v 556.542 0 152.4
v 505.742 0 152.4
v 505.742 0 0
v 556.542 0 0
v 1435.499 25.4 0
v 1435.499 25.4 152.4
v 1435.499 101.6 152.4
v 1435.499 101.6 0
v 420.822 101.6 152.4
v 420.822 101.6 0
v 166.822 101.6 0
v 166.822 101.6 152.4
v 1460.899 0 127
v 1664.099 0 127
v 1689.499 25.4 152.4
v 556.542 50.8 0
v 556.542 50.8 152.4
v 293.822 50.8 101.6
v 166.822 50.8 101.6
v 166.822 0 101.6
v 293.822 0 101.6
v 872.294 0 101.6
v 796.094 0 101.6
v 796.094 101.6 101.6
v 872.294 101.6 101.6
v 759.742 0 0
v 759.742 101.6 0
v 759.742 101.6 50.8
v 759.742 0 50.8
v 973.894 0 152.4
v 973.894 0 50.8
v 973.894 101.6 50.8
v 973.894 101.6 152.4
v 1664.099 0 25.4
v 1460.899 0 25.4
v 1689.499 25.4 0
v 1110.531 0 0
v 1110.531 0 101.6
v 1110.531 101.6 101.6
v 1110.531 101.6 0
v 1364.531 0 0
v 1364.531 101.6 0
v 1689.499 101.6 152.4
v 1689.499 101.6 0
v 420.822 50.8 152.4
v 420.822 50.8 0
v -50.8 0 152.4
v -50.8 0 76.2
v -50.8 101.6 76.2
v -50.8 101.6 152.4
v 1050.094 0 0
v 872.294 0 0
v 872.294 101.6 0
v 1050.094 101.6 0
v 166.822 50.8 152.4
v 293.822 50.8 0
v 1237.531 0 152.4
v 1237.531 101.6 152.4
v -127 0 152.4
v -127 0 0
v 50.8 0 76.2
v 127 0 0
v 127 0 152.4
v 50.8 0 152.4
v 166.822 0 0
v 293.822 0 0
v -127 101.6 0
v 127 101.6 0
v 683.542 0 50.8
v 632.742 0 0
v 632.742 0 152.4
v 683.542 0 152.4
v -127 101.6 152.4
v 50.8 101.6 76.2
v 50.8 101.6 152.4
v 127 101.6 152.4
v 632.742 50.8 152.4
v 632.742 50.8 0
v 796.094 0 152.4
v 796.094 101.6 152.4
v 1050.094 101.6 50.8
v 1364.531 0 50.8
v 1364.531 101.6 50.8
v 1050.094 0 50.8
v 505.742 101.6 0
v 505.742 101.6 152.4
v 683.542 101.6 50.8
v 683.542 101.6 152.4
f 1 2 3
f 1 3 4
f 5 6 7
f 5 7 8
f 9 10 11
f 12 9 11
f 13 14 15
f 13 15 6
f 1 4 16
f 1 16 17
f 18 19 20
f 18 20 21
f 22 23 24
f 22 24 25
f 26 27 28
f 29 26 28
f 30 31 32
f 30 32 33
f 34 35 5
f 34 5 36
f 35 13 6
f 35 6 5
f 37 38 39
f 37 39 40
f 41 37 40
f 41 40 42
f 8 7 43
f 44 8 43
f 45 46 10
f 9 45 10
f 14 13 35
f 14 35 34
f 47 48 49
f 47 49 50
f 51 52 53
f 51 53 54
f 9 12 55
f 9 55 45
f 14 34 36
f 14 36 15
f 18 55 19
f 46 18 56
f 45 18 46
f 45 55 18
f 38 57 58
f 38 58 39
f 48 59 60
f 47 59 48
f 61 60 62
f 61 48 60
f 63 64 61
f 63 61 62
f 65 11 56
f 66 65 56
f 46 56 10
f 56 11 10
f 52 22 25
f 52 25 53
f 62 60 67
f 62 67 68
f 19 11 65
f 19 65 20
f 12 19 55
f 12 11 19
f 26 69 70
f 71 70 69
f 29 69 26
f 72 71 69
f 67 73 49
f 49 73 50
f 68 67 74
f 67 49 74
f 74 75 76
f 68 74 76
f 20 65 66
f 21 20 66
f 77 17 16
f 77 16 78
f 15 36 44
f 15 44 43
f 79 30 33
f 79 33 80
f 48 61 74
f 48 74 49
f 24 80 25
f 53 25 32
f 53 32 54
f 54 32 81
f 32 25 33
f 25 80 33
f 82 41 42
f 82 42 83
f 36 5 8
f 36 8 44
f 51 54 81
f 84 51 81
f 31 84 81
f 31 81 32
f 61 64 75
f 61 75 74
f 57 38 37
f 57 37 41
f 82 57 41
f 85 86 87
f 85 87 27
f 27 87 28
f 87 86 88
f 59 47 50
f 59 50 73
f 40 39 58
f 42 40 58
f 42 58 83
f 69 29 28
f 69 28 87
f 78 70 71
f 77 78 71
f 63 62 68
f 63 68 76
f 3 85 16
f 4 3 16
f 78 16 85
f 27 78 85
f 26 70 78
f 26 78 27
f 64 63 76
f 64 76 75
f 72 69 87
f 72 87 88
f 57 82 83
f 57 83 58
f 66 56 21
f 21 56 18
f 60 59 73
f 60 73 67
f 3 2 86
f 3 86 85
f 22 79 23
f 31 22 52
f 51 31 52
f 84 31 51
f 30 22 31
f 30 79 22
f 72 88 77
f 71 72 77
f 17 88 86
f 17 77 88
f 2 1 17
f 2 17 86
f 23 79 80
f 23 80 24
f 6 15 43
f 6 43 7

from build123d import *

# Parameters (mm, degrees)
F1_DEPTH  = 101.6
F3_DEPTH  = 152.4
F4_DEPTH  = 25.4
F5_W      = 127
F5_H      = 50.8
F6_DEPTH  = 25.4
F7_DEPTH  = 25.4
F9_DEPTH  = 101.6
F10_W     = 76.2
F10_H     = 152.4
F11_DEPTH = 50.8
F13_DEPTH = 101.6
F15_DEPTH = 101.6
F16_W     = 203.2
F16_H     = 101.6
F17_DEPTH = 101.6
F18_SIZE  = 25.4


with BuildPart() as f1:
    # F0 (on Front) → F1 (new body)
    with BuildSketch(Plane.XZ):
        Polygon((-127, 0), (0, 0), (127, 0), (127, 152.4), (50.8, 152.4), (50.8, 76.2), (-50.8, 76.2), (-50.8, 152.4), (-127, 152.4), align=None)
    extrude(amount=-F1_DEPTH)


with BuildPart() as f3:
    # F2 (on Top) → F3 (new body)
    with BuildSketch(Plane.XY):
        Polygon((166.8223488978, 101.6), (166.8223488978, 0), (293.8223488978, 0), (293.8223488978, 50.8), (420.8223488978, 50.8), (420.8223488978, 101.6), align=None)
    extrude(amount=F3_DEPTH)

    # F4 (cut): a face of the model
    f4_faces = [f3.faces().sort_by_distance(p)[0] for p in [
        (230.3223488978, 0, 76.2),
    ]]
    extrude(f4_faces, amount=-F4_DEPTH, mode=Mode.SUBTRACT)

    # F5 (on face) → F6 (cut)
    with BuildSketch(Plane.XZ.offset(-25.4)):
        with Locations((230.3223488978, 127)):
            Rectangle(F5_W, F5_H)
    extrude(amount=-F6_DEPTH, mode=Mode.SUBTRACT)

    # F7 (add): a face of the model
    f7_faces = [f3.faces().sort_by_distance(p)[0] for p in [
        (230.3223488978, 25.4, 50.8),
    ]]
    extrude(f7_faces, amount=F7_DEPTH)


with BuildPart() as f9:
    # F8 (on Front) → F9 (new body)
    with BuildSketch(Plane.XZ):
        Polygon((505.7421922684, 152.4), (505.7421922684, 0), (759.7421922684, 0), (759.7421922684, 50.8), (683.5421922684, 50.8), (683.5421922684, 152.4), align=None)
    extrude(amount=-F9_DEPTH)

    # F10 (on face) → F11 (cut)
    with BuildSketch(Plane.XZ):
        with Locations((594.6421922684, 76.2)):
            Rectangle(F10_W, F10_H)
    extrude(amount=-F11_DEPTH, mode=Mode.SUBTRACT)


with BuildPart() as f13:
    # F12 (on Front) → F13 (new body)
    with BuildSketch(Plane.XZ):
        Polygon((973.8938811302, 152.4), (796.0938811302, 152.4), (796.0938811302, 101.6), (872.2938811302, 101.6), (872.2938811302, 0), (1050.0938811302, 0), (1050.0938811302, 50.8), (973.8938811302, 50.8), align=None)
    extrude(amount=-F13_DEPTH)


with BuildPart() as f15:
    # F14 (on Front) → F15 (new body)
    with BuildSketch(Plane.XZ):
        Polygon((1110.5307340622, 101.6), (1110.5307340622, 0), (1237.5307340622, 0), (1364.5307340622, 0), (1364.5307340622, 50.8), (1237.5307340622, 152.4), align=None)
    extrude(amount=-F15_DEPTH)


with BuildPart() as f17:
    # F16 (on Front) → F17 (new body)
    with BuildSketch(Plane.XZ):
        Polygon((1435.4985952377, 152.4), (1435.4985952377, 0), (1460.8985952377, 0), (1689.4985952377, 0), (1689.4985952377, 152.4), align=None)
        with Locations((1562.4985952377, 76.2)):
            Rectangle(F16_W, F16_H, mode=Mode.SUBTRACT)
        with Locations((1562.4985952377, 76.2)):
            Rectangle(F16_W, F16_H)
    extrude(amount=-F17_DEPTH)

    # F18
    f18_edges = [f17.edges().sort_by_distance(p)[0] for p in [
        (1435.498595, 0, 76.2),
        (1562.498595, 0, 0),
        (1689.498595, 0, 76.2),
        (1562.498595, 0, 152.4),
    ]]
    chamfer(f18_edges, length=F18_SIZE)


solid = Compound([f1.part, f3.part, f9.part, f13.part, f15.part, f17.part])
